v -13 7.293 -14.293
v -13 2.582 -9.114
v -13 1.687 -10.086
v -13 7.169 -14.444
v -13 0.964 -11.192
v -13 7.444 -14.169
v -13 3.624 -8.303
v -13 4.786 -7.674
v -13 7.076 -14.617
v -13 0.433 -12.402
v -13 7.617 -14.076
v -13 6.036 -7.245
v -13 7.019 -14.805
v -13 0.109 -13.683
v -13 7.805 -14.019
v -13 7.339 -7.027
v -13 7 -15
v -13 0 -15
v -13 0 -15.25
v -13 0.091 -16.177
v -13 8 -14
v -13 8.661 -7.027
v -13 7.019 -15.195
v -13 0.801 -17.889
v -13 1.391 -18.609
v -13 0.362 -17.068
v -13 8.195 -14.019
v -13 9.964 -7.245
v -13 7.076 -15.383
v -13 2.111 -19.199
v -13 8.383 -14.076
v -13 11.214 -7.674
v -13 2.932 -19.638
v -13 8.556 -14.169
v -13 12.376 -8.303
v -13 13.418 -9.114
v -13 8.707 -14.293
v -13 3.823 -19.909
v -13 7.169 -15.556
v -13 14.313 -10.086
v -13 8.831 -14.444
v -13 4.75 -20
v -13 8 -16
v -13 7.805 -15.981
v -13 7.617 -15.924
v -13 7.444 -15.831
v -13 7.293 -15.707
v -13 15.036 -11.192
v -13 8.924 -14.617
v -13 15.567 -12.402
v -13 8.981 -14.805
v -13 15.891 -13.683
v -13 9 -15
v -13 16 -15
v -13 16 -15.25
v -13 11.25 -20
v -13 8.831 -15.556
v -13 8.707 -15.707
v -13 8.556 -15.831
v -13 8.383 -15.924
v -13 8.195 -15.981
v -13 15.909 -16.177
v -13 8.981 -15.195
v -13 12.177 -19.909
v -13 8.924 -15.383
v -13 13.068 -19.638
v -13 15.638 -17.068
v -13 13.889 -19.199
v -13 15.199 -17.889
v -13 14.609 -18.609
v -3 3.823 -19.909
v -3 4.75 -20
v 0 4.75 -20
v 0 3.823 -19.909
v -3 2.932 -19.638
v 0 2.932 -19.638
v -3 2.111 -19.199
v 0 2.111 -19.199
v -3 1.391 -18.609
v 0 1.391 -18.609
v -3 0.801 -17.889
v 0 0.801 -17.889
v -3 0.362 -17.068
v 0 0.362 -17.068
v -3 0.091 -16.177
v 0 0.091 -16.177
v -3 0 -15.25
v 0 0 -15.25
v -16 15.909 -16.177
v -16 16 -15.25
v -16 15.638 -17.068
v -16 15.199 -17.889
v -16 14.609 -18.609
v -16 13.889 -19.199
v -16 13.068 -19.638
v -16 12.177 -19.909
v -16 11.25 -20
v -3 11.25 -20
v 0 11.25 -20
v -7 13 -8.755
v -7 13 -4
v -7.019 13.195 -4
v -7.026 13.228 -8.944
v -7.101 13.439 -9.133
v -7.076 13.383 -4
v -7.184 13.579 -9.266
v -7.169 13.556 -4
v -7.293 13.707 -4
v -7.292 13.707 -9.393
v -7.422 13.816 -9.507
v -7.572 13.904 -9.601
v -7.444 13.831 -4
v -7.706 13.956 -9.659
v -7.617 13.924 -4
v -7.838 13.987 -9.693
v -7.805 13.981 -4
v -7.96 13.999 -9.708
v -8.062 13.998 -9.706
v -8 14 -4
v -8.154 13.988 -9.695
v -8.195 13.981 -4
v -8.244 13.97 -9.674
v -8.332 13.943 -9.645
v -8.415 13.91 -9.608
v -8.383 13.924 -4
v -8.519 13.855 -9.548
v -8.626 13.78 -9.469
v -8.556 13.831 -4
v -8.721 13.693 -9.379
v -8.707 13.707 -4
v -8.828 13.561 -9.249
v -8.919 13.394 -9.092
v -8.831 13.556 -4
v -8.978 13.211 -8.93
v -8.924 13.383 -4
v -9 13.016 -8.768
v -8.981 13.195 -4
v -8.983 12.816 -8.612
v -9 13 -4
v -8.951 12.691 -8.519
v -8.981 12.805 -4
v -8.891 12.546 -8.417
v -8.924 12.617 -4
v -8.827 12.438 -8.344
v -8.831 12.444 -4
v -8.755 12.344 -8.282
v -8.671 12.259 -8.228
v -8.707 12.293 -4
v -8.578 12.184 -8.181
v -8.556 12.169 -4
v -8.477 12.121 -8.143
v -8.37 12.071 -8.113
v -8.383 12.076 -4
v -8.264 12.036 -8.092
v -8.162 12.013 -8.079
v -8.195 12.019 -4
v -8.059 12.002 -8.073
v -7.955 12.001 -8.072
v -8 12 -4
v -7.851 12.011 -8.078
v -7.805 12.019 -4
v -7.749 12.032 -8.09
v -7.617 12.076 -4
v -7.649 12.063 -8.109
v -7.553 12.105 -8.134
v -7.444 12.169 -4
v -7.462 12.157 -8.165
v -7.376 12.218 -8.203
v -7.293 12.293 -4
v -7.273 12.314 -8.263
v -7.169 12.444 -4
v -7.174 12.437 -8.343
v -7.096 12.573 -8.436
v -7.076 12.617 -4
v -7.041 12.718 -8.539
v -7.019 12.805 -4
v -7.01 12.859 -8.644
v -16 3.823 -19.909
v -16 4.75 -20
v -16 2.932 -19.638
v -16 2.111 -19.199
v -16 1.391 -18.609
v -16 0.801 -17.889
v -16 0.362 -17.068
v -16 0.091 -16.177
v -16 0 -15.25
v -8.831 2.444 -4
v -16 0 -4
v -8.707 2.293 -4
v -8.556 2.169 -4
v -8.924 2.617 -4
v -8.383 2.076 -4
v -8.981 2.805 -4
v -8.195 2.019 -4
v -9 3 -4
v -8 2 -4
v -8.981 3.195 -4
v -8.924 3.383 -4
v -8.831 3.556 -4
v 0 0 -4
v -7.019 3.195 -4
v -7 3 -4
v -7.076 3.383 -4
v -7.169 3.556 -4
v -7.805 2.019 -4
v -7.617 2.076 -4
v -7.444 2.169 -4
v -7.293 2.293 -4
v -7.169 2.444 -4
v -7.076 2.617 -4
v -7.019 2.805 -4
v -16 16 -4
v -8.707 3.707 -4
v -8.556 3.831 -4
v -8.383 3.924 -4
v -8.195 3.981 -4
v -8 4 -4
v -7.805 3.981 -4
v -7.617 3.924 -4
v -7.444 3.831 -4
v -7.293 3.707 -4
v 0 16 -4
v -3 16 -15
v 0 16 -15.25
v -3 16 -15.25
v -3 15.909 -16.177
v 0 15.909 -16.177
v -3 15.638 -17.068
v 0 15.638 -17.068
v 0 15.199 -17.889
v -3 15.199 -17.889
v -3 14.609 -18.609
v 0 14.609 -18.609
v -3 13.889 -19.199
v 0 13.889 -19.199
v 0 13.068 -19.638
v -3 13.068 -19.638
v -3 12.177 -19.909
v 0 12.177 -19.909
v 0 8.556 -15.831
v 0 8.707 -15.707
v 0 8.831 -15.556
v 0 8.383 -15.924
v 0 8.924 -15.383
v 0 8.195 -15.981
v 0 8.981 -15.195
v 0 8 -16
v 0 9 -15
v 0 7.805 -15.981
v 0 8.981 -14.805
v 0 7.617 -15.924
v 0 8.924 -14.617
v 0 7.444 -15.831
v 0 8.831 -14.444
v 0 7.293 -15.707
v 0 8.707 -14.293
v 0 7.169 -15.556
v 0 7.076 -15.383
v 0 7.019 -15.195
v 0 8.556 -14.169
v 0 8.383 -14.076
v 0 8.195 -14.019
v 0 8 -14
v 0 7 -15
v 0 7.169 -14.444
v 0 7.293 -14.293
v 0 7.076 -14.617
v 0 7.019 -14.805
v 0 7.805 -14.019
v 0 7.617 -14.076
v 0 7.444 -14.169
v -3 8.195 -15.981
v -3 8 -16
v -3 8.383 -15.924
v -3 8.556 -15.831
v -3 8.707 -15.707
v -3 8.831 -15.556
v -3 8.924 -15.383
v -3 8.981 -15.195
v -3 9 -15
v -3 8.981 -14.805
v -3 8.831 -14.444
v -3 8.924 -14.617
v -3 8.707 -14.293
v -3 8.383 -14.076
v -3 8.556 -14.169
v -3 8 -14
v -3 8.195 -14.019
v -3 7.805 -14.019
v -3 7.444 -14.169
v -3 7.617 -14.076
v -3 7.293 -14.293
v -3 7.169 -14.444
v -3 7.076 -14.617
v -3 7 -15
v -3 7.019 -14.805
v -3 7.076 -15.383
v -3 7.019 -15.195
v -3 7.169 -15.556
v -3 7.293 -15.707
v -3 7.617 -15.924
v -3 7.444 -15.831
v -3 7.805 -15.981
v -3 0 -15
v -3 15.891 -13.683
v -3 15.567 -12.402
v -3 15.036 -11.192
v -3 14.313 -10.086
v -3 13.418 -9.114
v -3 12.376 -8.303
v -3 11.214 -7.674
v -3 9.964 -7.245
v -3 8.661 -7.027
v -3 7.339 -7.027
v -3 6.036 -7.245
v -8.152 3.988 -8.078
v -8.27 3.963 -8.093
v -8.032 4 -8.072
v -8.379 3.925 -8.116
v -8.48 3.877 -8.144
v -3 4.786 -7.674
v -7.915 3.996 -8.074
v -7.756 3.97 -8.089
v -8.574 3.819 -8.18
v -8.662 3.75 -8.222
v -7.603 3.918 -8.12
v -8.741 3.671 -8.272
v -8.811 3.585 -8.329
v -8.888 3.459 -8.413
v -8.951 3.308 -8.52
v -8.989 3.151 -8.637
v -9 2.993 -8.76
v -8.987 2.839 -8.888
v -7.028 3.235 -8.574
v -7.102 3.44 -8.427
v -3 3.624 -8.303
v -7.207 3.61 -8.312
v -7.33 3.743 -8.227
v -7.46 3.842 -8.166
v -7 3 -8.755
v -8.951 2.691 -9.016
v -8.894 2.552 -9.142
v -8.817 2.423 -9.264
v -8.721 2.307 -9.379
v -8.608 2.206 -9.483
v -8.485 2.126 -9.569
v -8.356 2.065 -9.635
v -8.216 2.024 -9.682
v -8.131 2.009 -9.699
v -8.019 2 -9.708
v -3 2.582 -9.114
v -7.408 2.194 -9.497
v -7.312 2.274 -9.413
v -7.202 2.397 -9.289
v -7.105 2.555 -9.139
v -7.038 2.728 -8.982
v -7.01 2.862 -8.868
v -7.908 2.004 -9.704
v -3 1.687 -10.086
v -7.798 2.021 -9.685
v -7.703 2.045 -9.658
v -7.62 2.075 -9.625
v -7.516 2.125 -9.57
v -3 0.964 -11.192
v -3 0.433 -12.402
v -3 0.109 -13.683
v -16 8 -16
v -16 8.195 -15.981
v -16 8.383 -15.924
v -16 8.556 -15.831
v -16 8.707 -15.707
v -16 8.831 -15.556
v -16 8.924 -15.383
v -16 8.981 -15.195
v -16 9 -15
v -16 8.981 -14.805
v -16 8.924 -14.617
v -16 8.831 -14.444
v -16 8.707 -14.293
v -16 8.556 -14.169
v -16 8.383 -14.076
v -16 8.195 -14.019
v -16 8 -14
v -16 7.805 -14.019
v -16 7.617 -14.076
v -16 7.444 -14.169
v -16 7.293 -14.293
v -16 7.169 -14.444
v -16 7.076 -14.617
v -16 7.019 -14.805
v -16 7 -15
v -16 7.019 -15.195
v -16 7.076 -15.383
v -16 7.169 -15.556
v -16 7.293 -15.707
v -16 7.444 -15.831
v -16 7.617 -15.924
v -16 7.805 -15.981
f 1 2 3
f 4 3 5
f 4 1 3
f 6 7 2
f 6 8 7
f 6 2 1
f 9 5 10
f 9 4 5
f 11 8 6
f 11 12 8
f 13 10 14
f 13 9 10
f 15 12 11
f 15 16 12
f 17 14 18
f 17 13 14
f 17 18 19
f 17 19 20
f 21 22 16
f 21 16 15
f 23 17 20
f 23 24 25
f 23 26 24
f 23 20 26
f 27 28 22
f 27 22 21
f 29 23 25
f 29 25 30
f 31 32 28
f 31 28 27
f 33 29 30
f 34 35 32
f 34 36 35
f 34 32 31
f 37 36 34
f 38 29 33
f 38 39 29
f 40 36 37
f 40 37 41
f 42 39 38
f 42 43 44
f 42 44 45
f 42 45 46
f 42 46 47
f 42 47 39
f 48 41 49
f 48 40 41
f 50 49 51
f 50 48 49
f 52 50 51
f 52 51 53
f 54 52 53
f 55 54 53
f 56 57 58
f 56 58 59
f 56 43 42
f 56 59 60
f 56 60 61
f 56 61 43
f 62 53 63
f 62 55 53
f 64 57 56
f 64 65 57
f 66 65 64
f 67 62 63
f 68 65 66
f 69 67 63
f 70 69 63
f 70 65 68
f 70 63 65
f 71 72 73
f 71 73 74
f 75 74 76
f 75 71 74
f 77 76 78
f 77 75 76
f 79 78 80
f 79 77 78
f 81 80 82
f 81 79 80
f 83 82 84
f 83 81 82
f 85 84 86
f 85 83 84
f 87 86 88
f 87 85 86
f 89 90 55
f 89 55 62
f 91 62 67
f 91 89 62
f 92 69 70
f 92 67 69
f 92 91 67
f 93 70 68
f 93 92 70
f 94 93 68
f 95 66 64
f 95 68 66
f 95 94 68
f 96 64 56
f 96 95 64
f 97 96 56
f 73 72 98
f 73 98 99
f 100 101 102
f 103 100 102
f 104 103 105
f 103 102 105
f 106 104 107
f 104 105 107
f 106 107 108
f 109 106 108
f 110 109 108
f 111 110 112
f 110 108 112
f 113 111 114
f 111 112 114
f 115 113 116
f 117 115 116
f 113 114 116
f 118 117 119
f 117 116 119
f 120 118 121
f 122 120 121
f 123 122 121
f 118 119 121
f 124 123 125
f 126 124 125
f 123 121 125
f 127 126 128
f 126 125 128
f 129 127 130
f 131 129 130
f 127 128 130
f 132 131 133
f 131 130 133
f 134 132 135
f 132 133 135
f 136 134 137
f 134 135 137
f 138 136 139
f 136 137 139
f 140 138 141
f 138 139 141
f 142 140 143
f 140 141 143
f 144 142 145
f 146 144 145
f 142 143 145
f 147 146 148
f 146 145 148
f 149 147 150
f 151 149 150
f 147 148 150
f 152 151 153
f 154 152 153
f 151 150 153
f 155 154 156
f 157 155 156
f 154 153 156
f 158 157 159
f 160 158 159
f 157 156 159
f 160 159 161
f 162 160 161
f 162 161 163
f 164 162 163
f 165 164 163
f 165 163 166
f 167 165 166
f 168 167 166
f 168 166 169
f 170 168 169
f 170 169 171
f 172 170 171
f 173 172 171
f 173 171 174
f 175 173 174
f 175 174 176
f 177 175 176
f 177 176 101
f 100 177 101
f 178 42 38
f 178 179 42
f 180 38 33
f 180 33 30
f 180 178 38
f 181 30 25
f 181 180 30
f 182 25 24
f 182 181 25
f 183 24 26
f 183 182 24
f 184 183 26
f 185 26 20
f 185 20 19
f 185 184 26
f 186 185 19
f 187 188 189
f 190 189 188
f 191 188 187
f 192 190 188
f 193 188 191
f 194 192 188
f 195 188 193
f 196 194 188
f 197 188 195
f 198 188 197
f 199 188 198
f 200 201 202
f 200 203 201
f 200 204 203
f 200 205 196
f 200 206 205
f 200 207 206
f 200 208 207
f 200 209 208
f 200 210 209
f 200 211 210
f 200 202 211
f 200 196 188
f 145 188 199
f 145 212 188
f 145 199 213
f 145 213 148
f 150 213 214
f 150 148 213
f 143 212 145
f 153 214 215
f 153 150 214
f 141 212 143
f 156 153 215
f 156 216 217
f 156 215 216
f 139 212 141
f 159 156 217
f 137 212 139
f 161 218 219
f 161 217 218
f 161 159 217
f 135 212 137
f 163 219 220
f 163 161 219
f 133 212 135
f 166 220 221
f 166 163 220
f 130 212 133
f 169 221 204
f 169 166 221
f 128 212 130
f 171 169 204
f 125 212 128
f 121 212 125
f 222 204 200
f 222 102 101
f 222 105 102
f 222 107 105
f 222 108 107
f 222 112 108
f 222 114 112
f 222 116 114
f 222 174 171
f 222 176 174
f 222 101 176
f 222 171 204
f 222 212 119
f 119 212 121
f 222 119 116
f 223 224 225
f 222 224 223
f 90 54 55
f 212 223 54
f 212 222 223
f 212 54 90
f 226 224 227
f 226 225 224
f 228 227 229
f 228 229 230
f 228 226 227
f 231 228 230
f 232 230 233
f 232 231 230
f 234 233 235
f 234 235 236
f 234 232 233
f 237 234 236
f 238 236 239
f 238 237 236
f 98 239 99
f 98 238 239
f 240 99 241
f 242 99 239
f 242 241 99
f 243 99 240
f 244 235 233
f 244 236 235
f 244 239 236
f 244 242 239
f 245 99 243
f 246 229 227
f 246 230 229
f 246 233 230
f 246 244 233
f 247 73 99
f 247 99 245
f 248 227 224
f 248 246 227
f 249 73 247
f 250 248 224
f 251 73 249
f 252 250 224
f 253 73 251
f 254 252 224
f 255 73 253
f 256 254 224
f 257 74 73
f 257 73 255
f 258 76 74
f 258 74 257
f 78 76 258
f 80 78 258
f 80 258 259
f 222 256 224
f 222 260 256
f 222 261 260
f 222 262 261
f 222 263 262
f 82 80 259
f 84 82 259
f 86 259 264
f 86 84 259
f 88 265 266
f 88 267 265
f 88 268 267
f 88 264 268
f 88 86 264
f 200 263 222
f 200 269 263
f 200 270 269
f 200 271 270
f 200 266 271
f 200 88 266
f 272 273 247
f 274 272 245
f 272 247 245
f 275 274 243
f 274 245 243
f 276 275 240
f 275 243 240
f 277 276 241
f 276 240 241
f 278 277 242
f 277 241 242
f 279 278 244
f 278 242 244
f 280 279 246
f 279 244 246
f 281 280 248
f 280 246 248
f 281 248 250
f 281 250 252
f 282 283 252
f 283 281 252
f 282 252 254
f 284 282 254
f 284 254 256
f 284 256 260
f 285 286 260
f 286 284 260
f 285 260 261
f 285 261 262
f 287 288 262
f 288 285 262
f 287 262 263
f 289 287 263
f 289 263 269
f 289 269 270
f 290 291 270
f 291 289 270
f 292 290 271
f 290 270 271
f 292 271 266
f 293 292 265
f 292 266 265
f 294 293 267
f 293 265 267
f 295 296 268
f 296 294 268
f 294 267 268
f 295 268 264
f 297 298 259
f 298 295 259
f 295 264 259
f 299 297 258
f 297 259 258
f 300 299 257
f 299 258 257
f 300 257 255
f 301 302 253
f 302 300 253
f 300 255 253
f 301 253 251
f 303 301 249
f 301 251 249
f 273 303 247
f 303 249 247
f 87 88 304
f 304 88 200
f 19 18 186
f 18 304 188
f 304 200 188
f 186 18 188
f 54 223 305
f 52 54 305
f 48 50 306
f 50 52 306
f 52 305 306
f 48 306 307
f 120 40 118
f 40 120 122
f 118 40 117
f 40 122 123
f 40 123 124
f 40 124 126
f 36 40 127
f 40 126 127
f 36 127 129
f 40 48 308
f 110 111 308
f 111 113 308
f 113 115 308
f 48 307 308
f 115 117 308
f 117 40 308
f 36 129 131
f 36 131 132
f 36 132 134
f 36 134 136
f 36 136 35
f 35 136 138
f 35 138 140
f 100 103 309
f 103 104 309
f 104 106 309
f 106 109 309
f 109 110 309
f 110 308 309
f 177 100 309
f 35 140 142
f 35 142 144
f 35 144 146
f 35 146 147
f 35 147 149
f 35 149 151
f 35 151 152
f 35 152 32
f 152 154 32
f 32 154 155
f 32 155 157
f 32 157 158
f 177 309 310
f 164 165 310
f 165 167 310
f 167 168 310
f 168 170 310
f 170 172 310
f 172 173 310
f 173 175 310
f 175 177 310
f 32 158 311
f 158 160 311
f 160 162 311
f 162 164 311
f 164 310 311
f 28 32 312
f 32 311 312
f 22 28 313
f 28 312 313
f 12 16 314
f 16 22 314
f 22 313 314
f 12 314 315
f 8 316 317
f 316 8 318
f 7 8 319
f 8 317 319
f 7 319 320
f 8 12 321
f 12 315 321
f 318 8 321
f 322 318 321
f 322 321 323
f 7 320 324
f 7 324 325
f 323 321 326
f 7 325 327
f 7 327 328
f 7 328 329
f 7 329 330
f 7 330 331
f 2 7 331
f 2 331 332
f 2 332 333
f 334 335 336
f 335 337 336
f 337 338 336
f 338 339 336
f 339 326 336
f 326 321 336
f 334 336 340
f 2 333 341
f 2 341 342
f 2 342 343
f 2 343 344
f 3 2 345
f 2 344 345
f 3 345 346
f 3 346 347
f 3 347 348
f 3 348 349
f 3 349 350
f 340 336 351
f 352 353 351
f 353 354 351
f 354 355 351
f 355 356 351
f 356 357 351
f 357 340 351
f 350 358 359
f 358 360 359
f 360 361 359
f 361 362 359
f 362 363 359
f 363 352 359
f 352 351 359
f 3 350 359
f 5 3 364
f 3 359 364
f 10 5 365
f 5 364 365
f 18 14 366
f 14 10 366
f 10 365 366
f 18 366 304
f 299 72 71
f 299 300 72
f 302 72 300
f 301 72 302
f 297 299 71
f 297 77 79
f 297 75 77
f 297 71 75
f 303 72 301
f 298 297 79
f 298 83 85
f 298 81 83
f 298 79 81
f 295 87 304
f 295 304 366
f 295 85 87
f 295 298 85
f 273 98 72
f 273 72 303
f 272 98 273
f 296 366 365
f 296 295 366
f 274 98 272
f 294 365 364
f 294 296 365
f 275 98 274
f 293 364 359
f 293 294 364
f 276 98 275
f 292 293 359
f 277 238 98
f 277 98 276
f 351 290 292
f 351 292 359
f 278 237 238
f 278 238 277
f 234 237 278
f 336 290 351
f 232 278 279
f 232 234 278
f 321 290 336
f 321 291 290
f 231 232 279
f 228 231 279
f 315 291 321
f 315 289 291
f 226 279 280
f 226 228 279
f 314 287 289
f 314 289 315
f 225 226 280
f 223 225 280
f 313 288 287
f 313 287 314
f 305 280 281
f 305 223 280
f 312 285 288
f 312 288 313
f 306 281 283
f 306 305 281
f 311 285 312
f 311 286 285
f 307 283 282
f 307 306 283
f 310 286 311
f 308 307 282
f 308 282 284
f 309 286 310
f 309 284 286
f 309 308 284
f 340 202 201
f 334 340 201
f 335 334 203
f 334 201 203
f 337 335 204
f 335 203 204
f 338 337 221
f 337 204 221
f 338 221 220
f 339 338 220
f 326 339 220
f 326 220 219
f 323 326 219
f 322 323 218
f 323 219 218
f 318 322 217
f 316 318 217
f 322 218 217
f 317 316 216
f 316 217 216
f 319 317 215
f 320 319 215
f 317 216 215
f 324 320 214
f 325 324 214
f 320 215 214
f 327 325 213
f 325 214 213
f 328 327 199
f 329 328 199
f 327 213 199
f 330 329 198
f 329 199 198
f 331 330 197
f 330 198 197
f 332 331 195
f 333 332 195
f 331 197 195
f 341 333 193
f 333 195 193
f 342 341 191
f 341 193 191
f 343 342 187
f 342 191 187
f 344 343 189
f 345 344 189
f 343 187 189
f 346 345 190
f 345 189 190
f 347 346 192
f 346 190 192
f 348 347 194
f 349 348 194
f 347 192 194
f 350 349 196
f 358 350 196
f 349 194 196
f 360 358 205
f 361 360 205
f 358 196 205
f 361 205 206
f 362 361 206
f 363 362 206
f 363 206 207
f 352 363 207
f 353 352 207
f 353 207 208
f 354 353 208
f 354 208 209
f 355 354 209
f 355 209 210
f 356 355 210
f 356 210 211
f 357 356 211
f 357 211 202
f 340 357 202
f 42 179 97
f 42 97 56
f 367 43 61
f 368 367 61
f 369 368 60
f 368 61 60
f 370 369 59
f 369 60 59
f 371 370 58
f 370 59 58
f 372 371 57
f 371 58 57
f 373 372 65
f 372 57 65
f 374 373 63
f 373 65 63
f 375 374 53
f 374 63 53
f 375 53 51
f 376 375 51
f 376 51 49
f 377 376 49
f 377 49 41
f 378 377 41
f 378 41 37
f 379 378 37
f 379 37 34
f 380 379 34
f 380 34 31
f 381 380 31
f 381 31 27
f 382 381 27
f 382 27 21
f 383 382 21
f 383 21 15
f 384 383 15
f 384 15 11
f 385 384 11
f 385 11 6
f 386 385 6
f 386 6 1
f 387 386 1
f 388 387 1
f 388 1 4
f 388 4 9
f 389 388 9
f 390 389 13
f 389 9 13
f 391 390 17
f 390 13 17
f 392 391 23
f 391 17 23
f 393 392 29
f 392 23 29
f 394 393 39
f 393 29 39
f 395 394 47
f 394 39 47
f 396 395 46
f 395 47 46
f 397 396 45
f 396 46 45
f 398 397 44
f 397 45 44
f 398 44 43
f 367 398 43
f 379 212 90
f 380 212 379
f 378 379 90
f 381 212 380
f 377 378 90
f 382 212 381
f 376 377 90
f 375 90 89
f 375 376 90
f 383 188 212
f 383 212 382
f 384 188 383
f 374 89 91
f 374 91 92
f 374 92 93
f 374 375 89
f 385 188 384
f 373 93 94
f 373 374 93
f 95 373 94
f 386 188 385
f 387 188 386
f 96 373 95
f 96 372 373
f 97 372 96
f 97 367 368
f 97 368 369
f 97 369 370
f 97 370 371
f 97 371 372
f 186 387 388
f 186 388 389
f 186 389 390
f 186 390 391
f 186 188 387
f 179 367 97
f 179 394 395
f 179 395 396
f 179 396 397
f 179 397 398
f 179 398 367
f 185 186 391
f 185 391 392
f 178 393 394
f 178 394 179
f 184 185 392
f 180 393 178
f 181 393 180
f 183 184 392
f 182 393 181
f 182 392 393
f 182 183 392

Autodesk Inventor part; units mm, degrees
ref_plane "YZ Plane" through (0, 0, 0) normal (1, 0, 0) x (0, 1, 0)
ref_plane "XZ Plane" through (0, 0, 0) normal (0, 1, 0) x (-1, 0, 0)
sketch "Sketch1" plane through (0, 0, 0) normal (0, 1, 0) x (-1, 0, 0)
  line L0 (0, 0) -> (16, 0)
  line L1 (16, 0) -> (16, -20)
  line L2 (16, -20) -> (0, -20)
  line L3 (0, -20) -> (0, 0)
  dimension "d0" = 16
  dimension "d1" = 20
extrude "Extrusion1" add sketch "Sketch1" along normal blind 16
ref_plane "Work Plane1" through (0, 0, -15) normal (0, 0, -1) x (-1, 0, 0)
sketch "Sketch2" plane through (0, 0, -15) normal (0, 0, -1) x (-1, 0, 0)
  line L0 (16, 16) -> (0, 16) projected
  line L1 (8, 16) -> (3, 16)
  line L2 (3, 16) -> (13, 16)
  line L3 (0, 0) -> (0, 16) projected
  line L4 (0, 8) -> (3, 8)
  line L5 (3, 8) -> (13, 8)
  line L6 (13, 8) -> (13, 16)
  line L7 (13, 16) -> (3, 16)
  line L8 (3, 16) -> (3, 8)
  dimension "d5" = 5
revolve "Revolution1" cut sketch "Sketch2" angle 360 about axis through (-3, 8, -15) along (-1, 0, 0) contours L6 L5 L8 L0
fillet "Fillet1" radius 4.75 4 edges at (-8, 14.245, -20) (-8, 1.755, -20) (-8, 16, -20) (-8, 0, -20)
sketch "Sketch3" plane through (-16, 0, 0) normal (0, 0, 1) x (1, 0, 0)
  line L0 (0, 16) -> (16, 16) projected
  line L1 (0, 16) -> (16, 16)
  line L2 (16, 16) -> (16, 0)
  line L3 (16, 0) -> (0, 0)
  line L4 (0, 0) -> (0, 16)
extrude "Extrusion2" cut sketch "Sketch3" against normal blind 4
sketch "Sketch4" plane through (0, 4.75, -20) normal (1, 0, 0) x (0, 0, -1)
  arc A0 (-5, 11.25) -> (-5, -4.75) centre (-5, 3.25) ccw projected
  circle A1 centre (-5, 3.25) radius 1
  point P0 (-20, -4.75)
  dimension "d12" = 2
extrude "Extrusion3" cut sketch "Sketch4" against normal up to surface (16 mm away)
sketch "Sketch5" plane through (-16, 0, -4) normal (0, 0, 1) x (1, 0, 0)
  line L0 (0, 16) -> (16, 16) projected
  circle A0 centre (8, 3) radius 1
  circle A1 centre (8, 13) radius 1
  point P0 (16, 0)
  dimension "d16" = 2
extrude "Extrusion4" cut sketch "Sketch5" against normal blind 10
sketch "Sketch6" plane through (0, 16, 0) normal (0, 1, 0) x (1, 0, 0)
  line L0 (-13, 15) -> (-3, 15) projected
  line L1 (-13, 16.0838) -> (-3, 16.0838) projected
  line L2 (-3, 15) -> (-13, 15)
  line L3 (-13, 15) -> (-13, 16.0838)
  line L4 (-13, 16.0838) -> (-3, 16.0838)
  line L5 (-3, 16.0838) -> (-3, 15)
  point P0 (0, 0)
extrude "Extrusion5" cut sketch "Sketch6" against normal up to surface (16 mm away)
properties part number "Bearing_Holder"
